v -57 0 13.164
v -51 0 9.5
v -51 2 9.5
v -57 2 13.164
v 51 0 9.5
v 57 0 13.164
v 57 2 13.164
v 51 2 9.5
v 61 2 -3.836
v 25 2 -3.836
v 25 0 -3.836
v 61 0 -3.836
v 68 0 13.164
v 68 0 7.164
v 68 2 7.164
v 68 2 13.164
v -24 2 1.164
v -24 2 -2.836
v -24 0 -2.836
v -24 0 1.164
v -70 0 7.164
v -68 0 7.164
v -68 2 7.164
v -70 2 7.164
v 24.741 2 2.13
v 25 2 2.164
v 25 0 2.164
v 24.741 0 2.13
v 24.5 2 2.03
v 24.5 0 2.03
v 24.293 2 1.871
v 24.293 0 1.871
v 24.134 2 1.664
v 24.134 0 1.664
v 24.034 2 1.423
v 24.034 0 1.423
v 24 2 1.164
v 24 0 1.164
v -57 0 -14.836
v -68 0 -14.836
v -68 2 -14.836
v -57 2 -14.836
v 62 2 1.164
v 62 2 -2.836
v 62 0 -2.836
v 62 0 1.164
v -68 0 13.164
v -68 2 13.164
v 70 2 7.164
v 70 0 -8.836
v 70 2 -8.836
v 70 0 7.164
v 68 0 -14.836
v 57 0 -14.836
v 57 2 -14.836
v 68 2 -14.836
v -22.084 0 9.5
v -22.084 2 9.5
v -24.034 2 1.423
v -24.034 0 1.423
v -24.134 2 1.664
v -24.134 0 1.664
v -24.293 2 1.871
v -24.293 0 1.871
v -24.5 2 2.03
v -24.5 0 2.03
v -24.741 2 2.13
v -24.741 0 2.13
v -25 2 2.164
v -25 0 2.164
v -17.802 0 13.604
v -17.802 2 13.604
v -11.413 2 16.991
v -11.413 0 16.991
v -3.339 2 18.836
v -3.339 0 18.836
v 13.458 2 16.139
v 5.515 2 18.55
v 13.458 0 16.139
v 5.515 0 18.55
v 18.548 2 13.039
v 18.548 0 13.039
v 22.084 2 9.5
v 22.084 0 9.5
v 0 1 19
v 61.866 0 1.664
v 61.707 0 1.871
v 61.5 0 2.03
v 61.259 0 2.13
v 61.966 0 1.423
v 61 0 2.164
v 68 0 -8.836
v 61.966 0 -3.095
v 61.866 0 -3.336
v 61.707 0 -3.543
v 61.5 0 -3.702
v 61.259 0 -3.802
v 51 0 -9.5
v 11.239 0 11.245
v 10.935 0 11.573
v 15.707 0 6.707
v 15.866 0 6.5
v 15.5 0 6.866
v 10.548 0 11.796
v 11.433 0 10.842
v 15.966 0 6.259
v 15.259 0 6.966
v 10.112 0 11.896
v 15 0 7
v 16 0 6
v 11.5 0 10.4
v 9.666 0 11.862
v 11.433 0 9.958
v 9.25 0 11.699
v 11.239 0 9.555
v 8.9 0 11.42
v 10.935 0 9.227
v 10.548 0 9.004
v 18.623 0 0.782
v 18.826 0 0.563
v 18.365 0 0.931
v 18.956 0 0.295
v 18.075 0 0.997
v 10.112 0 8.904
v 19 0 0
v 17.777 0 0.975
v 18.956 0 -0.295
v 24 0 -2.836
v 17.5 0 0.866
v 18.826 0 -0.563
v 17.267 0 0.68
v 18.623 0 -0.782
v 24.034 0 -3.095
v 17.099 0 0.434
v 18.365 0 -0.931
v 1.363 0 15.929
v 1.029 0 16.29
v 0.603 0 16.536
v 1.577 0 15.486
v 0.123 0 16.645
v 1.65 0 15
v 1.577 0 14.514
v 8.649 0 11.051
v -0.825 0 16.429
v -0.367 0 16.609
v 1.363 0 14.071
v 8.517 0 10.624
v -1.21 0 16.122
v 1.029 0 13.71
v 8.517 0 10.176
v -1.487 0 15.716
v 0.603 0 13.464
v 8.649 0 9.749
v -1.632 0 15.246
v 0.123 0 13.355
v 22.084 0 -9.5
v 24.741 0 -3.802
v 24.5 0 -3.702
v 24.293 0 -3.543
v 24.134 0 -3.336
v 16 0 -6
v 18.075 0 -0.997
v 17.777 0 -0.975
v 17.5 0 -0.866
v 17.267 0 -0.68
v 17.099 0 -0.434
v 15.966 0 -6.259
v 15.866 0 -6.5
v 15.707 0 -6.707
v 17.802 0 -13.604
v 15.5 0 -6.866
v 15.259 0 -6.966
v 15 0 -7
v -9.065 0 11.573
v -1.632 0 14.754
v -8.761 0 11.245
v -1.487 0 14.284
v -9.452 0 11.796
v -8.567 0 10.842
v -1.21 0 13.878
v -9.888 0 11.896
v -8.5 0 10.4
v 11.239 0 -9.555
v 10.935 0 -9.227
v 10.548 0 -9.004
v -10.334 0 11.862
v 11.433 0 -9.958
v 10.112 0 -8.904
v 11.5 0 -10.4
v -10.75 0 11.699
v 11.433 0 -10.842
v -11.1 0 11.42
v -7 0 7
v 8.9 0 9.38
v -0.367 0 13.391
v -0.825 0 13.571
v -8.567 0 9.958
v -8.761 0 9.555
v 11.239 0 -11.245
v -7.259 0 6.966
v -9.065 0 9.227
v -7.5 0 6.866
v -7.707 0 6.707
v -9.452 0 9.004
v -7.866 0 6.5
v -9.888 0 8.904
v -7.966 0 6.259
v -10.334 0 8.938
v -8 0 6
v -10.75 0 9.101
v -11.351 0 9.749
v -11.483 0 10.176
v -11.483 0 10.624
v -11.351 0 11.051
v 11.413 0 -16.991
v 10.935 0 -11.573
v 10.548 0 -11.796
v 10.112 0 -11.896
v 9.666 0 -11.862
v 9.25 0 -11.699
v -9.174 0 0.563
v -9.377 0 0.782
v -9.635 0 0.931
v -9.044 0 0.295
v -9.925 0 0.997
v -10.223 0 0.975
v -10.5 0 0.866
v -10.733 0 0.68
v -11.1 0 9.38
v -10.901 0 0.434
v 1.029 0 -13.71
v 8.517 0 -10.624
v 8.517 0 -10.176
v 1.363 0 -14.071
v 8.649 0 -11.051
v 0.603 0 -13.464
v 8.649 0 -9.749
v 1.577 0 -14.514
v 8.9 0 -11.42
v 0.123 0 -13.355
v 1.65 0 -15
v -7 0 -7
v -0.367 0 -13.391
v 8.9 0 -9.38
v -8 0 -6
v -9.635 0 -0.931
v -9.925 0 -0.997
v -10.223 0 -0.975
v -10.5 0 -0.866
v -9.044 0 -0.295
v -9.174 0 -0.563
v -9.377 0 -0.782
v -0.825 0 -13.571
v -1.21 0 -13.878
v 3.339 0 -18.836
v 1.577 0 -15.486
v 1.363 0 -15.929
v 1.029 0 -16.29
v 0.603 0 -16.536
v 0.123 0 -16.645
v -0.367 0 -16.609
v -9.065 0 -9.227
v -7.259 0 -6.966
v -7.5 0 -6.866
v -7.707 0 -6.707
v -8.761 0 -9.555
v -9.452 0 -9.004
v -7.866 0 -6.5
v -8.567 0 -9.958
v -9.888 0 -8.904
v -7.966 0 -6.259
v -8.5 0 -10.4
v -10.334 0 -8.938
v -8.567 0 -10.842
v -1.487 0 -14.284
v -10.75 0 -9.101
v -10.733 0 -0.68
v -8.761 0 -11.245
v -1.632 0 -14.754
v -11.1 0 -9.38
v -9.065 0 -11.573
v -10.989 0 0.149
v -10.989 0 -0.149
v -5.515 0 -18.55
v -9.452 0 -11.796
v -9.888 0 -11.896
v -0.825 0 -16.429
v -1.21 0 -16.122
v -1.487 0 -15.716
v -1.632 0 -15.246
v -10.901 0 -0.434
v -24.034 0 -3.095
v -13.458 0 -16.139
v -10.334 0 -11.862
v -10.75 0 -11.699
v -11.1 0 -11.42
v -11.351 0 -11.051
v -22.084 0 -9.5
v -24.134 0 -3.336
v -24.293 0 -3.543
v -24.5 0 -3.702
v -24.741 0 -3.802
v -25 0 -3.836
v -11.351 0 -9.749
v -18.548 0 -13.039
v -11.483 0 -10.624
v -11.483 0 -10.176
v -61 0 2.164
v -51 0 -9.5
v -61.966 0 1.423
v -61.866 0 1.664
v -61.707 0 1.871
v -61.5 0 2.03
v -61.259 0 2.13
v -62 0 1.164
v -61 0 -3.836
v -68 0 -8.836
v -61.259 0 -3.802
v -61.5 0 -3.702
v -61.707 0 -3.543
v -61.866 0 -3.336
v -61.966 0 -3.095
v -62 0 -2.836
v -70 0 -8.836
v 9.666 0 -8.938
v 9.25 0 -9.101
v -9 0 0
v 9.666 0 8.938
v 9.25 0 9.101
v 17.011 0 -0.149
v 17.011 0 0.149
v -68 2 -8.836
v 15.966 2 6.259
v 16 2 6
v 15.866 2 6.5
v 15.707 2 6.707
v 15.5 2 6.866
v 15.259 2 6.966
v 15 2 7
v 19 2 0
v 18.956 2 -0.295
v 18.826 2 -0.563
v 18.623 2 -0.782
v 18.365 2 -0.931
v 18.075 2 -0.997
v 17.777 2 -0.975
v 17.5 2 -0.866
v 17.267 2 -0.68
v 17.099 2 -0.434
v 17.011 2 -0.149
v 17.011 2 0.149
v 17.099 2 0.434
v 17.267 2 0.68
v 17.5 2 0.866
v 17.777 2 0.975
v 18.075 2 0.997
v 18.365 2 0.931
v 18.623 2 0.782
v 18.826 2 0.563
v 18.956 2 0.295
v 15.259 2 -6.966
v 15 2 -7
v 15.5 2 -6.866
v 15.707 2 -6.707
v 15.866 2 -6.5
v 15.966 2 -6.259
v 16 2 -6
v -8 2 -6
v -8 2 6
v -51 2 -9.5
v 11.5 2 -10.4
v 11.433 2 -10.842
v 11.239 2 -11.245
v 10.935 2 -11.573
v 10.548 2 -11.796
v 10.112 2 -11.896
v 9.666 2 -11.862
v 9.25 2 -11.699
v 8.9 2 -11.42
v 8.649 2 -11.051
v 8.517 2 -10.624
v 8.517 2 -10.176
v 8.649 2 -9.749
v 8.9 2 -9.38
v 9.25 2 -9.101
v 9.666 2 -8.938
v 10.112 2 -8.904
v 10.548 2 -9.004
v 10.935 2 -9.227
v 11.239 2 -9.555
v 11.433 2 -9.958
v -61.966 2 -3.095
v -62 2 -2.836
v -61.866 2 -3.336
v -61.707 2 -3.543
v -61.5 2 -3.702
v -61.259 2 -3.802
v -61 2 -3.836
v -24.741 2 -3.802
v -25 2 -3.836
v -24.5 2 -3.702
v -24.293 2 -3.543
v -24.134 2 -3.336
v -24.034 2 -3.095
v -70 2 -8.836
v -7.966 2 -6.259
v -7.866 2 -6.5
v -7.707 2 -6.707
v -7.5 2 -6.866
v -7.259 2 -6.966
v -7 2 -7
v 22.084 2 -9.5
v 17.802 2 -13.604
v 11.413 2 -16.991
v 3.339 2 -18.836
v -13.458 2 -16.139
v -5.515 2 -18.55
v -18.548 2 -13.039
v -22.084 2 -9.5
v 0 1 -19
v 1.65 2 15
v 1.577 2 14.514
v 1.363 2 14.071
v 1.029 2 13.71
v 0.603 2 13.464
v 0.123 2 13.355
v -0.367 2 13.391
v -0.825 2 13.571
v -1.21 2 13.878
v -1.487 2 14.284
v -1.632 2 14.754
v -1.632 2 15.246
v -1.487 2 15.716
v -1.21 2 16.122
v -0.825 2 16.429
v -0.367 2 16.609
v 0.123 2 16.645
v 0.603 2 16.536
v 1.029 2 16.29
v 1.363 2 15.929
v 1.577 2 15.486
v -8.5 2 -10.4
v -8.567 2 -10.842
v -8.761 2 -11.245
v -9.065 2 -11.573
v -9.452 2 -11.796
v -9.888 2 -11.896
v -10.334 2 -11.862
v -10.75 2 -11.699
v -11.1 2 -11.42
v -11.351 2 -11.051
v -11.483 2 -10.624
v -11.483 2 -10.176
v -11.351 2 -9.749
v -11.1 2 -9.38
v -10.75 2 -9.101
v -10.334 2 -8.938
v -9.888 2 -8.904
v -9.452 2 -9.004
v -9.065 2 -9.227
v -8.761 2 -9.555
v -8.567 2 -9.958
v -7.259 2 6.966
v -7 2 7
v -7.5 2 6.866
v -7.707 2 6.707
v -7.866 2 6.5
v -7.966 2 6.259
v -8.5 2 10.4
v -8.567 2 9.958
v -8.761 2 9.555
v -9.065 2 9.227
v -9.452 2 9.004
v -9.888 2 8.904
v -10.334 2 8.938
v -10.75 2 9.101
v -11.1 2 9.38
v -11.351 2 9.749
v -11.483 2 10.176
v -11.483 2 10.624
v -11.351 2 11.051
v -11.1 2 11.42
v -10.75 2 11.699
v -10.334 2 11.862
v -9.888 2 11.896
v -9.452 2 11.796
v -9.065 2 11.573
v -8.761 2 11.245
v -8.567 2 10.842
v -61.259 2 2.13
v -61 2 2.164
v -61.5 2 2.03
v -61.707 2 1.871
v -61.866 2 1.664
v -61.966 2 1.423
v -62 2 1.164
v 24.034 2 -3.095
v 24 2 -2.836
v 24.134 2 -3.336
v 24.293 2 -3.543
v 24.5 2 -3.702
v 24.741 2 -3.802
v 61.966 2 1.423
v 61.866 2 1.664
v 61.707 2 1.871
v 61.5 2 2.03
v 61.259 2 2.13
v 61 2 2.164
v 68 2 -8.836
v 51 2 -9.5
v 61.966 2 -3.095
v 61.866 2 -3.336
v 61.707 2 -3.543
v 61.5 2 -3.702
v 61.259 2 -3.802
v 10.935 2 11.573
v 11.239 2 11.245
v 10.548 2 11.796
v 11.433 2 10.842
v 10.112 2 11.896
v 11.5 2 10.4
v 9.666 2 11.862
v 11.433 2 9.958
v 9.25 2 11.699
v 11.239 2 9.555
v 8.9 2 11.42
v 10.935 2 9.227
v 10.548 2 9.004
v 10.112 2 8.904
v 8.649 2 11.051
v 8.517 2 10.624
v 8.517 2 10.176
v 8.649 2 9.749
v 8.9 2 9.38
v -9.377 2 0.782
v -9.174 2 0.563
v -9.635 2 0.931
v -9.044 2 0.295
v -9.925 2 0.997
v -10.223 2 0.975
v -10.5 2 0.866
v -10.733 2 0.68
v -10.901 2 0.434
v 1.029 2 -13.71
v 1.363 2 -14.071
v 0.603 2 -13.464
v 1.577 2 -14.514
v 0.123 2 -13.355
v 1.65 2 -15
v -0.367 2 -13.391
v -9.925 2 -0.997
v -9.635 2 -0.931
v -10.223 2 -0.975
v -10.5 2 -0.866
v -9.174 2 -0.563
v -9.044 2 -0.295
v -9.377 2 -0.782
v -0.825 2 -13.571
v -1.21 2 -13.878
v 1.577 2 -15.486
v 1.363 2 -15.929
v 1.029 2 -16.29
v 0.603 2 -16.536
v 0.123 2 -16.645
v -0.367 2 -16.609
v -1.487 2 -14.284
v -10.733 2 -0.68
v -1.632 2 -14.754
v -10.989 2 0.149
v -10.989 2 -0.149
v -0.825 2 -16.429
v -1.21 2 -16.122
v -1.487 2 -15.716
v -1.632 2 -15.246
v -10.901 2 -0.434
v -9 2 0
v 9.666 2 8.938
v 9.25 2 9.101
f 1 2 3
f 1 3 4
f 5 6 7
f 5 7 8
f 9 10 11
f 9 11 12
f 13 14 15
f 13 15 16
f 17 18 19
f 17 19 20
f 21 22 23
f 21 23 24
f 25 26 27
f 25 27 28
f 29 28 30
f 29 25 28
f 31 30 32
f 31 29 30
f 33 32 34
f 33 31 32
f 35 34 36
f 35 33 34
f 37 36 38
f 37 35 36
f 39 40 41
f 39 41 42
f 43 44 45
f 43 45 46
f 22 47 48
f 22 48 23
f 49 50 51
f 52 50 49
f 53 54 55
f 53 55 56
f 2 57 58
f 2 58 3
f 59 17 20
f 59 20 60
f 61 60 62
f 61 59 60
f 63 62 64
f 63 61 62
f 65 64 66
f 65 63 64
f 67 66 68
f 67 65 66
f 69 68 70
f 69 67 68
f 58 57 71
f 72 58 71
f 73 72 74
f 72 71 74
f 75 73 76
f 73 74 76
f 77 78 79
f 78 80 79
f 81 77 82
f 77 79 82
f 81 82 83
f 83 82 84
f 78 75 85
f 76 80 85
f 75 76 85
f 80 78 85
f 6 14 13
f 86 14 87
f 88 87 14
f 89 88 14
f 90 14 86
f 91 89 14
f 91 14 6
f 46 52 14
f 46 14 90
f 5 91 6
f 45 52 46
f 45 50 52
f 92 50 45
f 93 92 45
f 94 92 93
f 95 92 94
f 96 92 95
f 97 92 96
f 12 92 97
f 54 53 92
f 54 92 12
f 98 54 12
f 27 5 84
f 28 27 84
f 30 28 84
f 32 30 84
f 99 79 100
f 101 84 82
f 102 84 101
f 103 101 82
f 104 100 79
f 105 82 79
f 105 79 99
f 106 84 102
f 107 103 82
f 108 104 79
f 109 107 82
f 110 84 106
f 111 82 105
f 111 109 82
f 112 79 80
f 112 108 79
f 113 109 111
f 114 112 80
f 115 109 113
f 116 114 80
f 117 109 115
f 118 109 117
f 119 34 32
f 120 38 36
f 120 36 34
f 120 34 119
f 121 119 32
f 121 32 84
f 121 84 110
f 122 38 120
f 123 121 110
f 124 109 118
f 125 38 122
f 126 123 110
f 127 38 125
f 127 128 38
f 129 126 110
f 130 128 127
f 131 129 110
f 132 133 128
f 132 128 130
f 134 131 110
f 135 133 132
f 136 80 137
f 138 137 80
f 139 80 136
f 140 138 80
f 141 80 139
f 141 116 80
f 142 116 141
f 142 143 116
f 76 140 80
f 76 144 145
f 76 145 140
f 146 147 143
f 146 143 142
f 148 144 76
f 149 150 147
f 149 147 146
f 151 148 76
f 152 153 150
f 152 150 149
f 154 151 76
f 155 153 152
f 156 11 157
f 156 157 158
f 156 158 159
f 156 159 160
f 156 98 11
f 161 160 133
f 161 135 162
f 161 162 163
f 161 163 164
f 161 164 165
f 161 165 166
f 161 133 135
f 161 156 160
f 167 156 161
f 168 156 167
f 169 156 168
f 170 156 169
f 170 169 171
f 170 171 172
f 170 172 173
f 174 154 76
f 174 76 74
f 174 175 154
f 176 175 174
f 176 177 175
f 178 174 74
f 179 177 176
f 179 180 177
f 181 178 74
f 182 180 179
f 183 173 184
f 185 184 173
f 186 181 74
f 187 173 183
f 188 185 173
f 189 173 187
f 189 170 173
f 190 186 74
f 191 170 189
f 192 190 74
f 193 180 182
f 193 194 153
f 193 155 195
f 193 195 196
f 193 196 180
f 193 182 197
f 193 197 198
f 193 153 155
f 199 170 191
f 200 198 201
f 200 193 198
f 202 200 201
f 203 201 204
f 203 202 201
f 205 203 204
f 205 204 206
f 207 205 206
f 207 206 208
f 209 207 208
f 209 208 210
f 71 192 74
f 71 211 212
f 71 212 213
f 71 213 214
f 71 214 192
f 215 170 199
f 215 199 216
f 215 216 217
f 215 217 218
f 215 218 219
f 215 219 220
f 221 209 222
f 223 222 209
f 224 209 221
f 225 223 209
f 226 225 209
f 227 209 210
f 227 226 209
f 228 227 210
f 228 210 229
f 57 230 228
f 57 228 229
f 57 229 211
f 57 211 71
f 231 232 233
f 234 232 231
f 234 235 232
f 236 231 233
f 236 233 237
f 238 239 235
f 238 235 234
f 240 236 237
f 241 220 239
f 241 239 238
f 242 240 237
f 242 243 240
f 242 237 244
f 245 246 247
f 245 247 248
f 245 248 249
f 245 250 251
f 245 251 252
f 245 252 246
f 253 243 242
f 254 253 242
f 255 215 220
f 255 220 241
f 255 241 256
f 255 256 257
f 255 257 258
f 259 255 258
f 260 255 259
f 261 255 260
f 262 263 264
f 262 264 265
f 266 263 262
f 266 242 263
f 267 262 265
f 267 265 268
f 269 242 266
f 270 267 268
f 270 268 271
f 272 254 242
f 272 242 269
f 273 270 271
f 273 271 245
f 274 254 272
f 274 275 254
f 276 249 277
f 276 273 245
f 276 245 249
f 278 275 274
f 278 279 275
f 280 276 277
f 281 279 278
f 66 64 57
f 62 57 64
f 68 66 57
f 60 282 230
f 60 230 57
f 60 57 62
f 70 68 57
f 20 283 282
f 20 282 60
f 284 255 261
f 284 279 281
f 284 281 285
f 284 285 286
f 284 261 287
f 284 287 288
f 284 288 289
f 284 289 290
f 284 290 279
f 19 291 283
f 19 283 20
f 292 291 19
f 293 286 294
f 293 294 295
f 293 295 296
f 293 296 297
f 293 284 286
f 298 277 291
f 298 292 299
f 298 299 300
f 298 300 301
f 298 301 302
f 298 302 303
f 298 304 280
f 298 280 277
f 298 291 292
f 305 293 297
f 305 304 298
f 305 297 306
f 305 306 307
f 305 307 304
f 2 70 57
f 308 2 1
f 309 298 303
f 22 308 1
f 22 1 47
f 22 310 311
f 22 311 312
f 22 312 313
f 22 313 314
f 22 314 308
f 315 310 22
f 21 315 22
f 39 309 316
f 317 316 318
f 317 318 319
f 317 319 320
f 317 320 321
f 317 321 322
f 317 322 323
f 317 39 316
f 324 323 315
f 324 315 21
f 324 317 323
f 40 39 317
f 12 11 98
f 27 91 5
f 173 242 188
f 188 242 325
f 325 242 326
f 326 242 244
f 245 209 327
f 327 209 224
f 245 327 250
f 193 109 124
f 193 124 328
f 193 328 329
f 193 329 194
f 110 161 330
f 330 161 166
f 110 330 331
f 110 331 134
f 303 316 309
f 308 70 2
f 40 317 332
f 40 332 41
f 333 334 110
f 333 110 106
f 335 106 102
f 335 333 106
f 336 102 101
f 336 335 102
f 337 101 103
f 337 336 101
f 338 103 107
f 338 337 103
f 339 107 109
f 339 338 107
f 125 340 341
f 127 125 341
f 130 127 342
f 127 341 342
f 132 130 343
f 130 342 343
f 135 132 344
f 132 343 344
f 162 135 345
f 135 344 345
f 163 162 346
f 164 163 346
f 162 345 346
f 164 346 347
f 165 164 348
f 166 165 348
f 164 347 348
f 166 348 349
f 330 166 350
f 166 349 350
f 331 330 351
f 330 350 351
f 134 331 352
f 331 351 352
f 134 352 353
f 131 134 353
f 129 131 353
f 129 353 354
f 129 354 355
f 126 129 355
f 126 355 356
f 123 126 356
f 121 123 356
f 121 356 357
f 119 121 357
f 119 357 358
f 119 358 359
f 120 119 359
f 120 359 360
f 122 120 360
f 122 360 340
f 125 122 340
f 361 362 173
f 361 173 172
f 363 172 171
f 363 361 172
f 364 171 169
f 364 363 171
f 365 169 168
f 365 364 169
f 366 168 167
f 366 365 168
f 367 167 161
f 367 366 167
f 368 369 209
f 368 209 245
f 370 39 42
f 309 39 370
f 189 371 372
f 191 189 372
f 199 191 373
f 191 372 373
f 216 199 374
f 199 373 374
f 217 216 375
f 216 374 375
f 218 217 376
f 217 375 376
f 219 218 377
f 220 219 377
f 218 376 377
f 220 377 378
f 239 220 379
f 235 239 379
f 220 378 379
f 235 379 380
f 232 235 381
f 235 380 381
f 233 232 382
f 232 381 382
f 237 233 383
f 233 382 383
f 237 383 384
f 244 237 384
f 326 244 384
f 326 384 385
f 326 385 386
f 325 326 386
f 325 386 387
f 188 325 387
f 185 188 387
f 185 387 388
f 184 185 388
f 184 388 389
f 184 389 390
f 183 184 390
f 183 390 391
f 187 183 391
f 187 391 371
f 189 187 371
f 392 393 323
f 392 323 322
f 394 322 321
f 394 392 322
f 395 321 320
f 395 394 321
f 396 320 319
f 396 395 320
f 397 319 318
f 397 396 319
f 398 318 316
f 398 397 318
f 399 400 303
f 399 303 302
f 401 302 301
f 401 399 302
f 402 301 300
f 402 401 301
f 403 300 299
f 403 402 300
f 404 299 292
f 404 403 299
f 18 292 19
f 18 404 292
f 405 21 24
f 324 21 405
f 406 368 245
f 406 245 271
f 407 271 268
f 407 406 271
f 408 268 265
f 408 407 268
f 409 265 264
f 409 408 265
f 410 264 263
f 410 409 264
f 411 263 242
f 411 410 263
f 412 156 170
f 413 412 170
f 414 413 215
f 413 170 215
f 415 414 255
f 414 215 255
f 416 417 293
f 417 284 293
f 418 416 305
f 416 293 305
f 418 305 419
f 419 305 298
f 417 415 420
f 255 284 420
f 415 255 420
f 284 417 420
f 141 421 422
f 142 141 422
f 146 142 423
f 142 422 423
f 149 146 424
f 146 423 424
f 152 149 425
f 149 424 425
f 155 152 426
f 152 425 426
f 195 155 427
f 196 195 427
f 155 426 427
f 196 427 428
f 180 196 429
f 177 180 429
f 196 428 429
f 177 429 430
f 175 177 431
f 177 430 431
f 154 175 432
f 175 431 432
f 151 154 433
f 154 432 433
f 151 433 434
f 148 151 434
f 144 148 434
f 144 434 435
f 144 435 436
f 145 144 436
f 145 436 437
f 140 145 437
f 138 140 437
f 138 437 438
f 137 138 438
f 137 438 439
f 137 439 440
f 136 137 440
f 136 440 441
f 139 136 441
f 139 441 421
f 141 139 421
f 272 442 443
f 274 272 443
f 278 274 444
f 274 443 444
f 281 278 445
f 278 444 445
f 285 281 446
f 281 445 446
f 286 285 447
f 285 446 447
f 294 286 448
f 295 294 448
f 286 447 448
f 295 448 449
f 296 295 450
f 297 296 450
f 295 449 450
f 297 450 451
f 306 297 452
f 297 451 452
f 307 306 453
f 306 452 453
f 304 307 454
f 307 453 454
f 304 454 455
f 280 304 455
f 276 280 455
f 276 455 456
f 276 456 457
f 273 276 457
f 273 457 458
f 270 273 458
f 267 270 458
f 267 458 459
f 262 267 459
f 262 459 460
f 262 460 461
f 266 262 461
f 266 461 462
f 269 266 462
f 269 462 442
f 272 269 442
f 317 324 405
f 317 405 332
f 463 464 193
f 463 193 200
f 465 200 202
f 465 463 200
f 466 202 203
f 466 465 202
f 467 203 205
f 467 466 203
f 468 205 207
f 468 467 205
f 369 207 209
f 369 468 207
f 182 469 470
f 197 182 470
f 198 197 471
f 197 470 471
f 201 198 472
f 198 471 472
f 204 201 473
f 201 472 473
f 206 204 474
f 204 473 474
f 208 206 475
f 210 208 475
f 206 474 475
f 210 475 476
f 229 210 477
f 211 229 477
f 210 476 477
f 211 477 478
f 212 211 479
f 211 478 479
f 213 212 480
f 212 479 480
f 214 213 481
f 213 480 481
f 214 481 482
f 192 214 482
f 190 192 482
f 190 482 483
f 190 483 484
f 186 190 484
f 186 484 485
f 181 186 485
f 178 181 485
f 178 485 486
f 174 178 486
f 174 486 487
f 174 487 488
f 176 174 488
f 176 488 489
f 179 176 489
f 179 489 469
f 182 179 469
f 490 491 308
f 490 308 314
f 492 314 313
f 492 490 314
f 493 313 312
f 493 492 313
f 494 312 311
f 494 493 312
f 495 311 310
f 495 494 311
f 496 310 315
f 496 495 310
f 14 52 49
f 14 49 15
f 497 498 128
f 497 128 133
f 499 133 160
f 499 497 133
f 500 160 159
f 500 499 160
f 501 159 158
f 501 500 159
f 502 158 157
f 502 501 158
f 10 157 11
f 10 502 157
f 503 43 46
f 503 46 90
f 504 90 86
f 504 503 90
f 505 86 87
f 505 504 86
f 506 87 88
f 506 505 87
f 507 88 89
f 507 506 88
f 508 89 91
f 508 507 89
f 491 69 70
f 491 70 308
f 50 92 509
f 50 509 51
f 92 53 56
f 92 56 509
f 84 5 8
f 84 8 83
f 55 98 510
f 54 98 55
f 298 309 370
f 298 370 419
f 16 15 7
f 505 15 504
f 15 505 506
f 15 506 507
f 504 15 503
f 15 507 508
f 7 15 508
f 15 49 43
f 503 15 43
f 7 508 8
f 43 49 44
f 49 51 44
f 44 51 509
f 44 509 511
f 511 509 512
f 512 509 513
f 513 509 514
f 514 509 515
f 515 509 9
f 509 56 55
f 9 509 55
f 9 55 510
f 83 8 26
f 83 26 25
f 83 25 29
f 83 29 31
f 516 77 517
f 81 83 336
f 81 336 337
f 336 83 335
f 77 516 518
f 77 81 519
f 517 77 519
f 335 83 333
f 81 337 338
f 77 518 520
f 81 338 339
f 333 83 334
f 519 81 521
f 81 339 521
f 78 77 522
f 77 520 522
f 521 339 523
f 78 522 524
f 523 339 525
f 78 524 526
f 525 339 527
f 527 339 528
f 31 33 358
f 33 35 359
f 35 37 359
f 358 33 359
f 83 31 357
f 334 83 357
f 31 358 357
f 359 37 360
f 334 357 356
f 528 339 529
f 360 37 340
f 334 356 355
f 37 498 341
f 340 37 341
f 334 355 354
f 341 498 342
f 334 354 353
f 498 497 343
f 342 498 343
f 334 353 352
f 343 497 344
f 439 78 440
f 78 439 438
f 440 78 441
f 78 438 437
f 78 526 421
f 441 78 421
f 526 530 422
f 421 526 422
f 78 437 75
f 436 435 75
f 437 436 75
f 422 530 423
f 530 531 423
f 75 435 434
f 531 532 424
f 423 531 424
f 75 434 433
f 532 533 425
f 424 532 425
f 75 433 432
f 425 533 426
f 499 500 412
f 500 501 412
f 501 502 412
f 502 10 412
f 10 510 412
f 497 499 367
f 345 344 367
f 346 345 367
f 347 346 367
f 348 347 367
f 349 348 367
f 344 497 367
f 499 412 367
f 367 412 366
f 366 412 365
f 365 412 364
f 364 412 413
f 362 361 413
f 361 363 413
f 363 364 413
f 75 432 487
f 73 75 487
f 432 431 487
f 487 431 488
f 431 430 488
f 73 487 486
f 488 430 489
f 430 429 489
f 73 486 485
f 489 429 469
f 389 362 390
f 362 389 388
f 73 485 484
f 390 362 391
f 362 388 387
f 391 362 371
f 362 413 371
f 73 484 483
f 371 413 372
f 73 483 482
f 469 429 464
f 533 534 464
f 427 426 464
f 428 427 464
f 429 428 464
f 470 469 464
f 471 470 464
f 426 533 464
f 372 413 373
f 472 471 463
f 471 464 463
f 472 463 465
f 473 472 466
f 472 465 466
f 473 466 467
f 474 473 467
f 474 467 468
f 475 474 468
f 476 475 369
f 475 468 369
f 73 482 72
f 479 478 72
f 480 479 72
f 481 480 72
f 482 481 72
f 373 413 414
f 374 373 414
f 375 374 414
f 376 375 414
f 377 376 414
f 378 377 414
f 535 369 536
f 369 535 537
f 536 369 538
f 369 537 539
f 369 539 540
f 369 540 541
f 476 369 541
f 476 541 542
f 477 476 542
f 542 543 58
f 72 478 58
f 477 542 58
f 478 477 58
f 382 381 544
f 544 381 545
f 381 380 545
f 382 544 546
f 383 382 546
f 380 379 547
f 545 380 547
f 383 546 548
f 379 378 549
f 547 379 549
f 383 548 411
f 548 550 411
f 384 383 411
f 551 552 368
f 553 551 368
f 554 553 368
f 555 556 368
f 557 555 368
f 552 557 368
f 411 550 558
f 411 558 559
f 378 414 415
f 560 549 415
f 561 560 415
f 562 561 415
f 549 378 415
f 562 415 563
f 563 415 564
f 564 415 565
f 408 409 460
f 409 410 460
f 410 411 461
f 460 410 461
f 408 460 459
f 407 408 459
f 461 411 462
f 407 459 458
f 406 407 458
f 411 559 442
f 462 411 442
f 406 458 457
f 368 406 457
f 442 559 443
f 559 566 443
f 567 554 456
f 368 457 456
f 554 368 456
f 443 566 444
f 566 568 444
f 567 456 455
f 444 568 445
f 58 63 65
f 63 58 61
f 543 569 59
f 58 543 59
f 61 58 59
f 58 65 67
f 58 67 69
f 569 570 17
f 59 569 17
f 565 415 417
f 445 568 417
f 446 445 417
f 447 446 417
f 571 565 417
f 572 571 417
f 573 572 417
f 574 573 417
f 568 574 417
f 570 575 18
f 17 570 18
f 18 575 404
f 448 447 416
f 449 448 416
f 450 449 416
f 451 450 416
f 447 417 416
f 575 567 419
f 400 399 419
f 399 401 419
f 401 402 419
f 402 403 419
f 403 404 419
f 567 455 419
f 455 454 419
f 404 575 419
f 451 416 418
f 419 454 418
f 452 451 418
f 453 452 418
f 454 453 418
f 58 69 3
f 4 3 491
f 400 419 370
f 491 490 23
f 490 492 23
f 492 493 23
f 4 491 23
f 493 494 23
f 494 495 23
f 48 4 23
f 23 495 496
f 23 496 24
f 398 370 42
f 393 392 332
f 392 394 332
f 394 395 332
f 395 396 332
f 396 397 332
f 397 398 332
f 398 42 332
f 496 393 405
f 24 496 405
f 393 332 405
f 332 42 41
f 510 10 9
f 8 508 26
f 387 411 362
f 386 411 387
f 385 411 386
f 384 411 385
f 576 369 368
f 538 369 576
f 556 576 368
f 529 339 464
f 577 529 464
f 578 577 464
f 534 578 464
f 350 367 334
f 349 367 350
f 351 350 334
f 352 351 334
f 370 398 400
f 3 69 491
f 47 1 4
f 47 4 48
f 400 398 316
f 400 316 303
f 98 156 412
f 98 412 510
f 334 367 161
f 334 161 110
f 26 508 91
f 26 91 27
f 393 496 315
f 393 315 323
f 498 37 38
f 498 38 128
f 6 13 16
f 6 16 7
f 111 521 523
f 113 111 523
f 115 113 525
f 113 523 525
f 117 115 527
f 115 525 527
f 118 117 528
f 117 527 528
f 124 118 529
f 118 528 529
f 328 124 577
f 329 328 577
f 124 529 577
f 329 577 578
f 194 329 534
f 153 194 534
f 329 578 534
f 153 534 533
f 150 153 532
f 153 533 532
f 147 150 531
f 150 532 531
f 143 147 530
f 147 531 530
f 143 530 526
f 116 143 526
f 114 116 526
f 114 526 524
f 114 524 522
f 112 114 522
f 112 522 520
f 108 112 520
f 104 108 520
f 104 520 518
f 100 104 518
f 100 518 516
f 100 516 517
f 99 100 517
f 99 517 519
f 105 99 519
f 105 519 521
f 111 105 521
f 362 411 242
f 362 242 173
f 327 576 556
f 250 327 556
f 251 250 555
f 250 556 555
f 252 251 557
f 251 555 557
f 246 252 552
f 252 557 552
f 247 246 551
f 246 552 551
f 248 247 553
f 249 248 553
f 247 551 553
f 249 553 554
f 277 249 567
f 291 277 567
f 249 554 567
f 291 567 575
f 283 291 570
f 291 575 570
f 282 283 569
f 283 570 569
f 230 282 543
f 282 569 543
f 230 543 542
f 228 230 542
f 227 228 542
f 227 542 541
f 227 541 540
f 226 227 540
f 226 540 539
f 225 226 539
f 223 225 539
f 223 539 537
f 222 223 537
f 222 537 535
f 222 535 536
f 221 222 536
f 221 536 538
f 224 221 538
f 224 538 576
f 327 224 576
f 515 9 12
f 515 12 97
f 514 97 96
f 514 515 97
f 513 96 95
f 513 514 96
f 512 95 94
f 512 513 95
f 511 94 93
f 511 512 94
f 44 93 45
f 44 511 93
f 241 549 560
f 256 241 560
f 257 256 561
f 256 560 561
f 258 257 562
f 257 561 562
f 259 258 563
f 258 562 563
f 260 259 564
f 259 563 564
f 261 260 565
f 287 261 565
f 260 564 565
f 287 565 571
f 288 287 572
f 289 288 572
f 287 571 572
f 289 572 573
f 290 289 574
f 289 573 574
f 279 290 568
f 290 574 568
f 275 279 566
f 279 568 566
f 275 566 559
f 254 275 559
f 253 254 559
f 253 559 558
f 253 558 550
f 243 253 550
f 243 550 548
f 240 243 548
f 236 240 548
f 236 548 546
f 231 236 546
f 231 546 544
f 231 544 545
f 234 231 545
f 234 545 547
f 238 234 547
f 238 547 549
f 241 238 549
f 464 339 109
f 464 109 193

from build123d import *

# Parameters (mm, degrees)
RESSALTO_EXTRUS_O1_DEPTH = 2
ESBO_O2_R                = 1.65
ESBO_O2_R_2              = 1.5
ESBO_O2_R_3              = 1
CORTE_EXTRUS_O1_DEPTH    = 3.0000001


with BuildPart() as part:
    # Esboço1 → Ressalto-extrusão1 (new body)
    with BuildSketch(Plane(origin=(0, 0, 0), x_dir=(1, 0, 0), z_dir=(0, 1, 0))):
        with BuildLine():
            Line((-57, 14.836150135), (-51, 9.5))
            Line((-51, 9.5), (-22.083647797, 9.5))
            add(Edge.make_bspline(
                [(22.083647797, 9.5), (0, 38), (-22.083647797, 9.5)],
                knots=[0.523598776, 0.523598776, 0.523598776, 2.617993878, 2.617993878, 2.617993878], degree=2, weights=[1, 0.5, 1]))
            Line((22.083647797, 9.5), (51, 9.5))
            Line((51, 9.5), (57, 14.836150135))
            Line((57, 14.836150135), (68, 14.836150135))
            Line((68, 14.836150135), (68, 8.836150135))
            Line((68, 8.836150135), (70, 8.836150135))
            Line((70, 8.836150135), (70, -7.163849865))
            Line((70, -7.163849865), (68, -7.163849865))
            Line((68, -7.163849865), (68, -13.163849865))
            Line((68, -13.163849865), (57, -13.163849865))
            Line((57, -13.163849865), (51, -9.5))
            Line((51, -9.5), (22.083647797, -9.5))
            add(Edge.make_bspline(
                [(-22.083647797, -9.5), (0, -38), (22.083647797, -9.5)],
                knots=[3.665191429, 3.665191429, 3.665191429, 5.759586532, 5.759586532, 5.759586532], degree=2, weights=[1, 0.5, 1]))
            Line((-22.083647797, -9.5), (-51, -9.5))
            Line((-51, -9.5), (-57, -13.163849865))
            Line((-57, -13.163849865), (-68, -13.163849865))
            Line((-68, -13.163849865), (-68, -7.163849865))
            Line((-68, -7.163849865), (-70, -7.163849865))
            Line((-70, -7.163849865), (-70, 8.836150135))
            Line((-70, 8.836150135), (-68, 8.836150135))
            Line((-68, 8.836150135), (-68, 14.836150135))
            Line((-68, 14.836150135), (-57, 14.836150135))
        make_face()
    extrude(amount=RESSALTO_EXTRUS_O1_DEPTH)

    # Esboço2 → Corte-extrusão1 (cut, through all)
    with BuildSketch(Plane(origin=(0, 2, 0), x_dir=(1, 0, 0), z_dir=(0, 1, 0))):
        with Locations((0, 15)):
            Circle(ESBO_O2_R)
        with Locations((10, 10.4)):
            Circle(ESBO_O2_R_2)
        with Locations((-10, 10.4)):
            Circle(ESBO_O2_R_2)
        with Locations((0, -15)):
            Circle(ESBO_O2_R)
        with Locations((10, -10.4)):
            Circle(ESBO_O2_R_2)
        with Locations((-10, -10.4)):
            Circle(ESBO_O2_R_2)
        with Locations((-10, 0)):
            Circle(ESBO_O2_R_3)
        with Locations((18, 0)):
            Circle(ESBO_O2_R_3)
        with BuildLine():
            Line((25, 3.836150135), (61, 3.836150135))
            ThreePointArc((61, 3.836150135), (61.707106781, 3.543256916), (62, 2.836150135))
            Line((62, 2.836150135), (62, -1.163849865))
            ThreePointArc((62, -1.163849865), (61.707106781, -1.870956646), (61, -2.163849865))
            Line((61, -2.163849865), (25, -2.163849865))
            ThreePointArc((25, -2.163849865), (24.292893219, -1.870956646), (24, -1.163849865))
            Line((24, -1.163849865), (24, 2.836150135))
            ThreePointArc((24, 2.836150135), (24.292893219, 3.543256916), (25, 3.836150135))
        make_face()
        with BuildLine():
            Line((-61, 3.836150135), (-25, 3.836150135))
            ThreePointArc((-25, 3.836150135), (-24.292893219, 3.543256916), (-24, 2.836150135))
            Line((-24, 2.836150135), (-24, -1.163849865))
            ThreePointArc((-24, -1.163849865), (-24.292893219, -1.870956646), (-25, -2.163849865))
            Line((-25, -2.163849865), (-61, -2.163849865))
            ThreePointArc((-61, -2.163849865), (-61.707106781, -1.870956646), (-62, -1.163849865))
            Line((-62, -1.163849865), (-62, 2.836150135))
            ThreePointArc((-62, 2.836150135), (-61.707106781, 3.543256916), (-61, 3.836150135))
        make_face()
        with BuildLine():
            Line((-7, 7), (15, 7))
            ThreePointArc((15, 7), (15.707106781, 6.707106781), (16, 6))
            Line((16, 6), (16, -6))
            ThreePointArc((16, -6), (15.707106781, -6.707106781), (15, -7))
            Line((15, -7), (-7, -7))
            ThreePointArc((-7, -7), (-7.707106781, -6.707106781), (-8, -6))
            Line((-8, -6), (-8, 6))
            ThreePointArc((-8, 6), (-7.707106781, 6.707106781), (-7, 7))
        make_face()
    extrude(amount=-CORTE_EXTRUS_O1_DEPTH, mode=Mode.SUBTRACT)


solid = part.part
